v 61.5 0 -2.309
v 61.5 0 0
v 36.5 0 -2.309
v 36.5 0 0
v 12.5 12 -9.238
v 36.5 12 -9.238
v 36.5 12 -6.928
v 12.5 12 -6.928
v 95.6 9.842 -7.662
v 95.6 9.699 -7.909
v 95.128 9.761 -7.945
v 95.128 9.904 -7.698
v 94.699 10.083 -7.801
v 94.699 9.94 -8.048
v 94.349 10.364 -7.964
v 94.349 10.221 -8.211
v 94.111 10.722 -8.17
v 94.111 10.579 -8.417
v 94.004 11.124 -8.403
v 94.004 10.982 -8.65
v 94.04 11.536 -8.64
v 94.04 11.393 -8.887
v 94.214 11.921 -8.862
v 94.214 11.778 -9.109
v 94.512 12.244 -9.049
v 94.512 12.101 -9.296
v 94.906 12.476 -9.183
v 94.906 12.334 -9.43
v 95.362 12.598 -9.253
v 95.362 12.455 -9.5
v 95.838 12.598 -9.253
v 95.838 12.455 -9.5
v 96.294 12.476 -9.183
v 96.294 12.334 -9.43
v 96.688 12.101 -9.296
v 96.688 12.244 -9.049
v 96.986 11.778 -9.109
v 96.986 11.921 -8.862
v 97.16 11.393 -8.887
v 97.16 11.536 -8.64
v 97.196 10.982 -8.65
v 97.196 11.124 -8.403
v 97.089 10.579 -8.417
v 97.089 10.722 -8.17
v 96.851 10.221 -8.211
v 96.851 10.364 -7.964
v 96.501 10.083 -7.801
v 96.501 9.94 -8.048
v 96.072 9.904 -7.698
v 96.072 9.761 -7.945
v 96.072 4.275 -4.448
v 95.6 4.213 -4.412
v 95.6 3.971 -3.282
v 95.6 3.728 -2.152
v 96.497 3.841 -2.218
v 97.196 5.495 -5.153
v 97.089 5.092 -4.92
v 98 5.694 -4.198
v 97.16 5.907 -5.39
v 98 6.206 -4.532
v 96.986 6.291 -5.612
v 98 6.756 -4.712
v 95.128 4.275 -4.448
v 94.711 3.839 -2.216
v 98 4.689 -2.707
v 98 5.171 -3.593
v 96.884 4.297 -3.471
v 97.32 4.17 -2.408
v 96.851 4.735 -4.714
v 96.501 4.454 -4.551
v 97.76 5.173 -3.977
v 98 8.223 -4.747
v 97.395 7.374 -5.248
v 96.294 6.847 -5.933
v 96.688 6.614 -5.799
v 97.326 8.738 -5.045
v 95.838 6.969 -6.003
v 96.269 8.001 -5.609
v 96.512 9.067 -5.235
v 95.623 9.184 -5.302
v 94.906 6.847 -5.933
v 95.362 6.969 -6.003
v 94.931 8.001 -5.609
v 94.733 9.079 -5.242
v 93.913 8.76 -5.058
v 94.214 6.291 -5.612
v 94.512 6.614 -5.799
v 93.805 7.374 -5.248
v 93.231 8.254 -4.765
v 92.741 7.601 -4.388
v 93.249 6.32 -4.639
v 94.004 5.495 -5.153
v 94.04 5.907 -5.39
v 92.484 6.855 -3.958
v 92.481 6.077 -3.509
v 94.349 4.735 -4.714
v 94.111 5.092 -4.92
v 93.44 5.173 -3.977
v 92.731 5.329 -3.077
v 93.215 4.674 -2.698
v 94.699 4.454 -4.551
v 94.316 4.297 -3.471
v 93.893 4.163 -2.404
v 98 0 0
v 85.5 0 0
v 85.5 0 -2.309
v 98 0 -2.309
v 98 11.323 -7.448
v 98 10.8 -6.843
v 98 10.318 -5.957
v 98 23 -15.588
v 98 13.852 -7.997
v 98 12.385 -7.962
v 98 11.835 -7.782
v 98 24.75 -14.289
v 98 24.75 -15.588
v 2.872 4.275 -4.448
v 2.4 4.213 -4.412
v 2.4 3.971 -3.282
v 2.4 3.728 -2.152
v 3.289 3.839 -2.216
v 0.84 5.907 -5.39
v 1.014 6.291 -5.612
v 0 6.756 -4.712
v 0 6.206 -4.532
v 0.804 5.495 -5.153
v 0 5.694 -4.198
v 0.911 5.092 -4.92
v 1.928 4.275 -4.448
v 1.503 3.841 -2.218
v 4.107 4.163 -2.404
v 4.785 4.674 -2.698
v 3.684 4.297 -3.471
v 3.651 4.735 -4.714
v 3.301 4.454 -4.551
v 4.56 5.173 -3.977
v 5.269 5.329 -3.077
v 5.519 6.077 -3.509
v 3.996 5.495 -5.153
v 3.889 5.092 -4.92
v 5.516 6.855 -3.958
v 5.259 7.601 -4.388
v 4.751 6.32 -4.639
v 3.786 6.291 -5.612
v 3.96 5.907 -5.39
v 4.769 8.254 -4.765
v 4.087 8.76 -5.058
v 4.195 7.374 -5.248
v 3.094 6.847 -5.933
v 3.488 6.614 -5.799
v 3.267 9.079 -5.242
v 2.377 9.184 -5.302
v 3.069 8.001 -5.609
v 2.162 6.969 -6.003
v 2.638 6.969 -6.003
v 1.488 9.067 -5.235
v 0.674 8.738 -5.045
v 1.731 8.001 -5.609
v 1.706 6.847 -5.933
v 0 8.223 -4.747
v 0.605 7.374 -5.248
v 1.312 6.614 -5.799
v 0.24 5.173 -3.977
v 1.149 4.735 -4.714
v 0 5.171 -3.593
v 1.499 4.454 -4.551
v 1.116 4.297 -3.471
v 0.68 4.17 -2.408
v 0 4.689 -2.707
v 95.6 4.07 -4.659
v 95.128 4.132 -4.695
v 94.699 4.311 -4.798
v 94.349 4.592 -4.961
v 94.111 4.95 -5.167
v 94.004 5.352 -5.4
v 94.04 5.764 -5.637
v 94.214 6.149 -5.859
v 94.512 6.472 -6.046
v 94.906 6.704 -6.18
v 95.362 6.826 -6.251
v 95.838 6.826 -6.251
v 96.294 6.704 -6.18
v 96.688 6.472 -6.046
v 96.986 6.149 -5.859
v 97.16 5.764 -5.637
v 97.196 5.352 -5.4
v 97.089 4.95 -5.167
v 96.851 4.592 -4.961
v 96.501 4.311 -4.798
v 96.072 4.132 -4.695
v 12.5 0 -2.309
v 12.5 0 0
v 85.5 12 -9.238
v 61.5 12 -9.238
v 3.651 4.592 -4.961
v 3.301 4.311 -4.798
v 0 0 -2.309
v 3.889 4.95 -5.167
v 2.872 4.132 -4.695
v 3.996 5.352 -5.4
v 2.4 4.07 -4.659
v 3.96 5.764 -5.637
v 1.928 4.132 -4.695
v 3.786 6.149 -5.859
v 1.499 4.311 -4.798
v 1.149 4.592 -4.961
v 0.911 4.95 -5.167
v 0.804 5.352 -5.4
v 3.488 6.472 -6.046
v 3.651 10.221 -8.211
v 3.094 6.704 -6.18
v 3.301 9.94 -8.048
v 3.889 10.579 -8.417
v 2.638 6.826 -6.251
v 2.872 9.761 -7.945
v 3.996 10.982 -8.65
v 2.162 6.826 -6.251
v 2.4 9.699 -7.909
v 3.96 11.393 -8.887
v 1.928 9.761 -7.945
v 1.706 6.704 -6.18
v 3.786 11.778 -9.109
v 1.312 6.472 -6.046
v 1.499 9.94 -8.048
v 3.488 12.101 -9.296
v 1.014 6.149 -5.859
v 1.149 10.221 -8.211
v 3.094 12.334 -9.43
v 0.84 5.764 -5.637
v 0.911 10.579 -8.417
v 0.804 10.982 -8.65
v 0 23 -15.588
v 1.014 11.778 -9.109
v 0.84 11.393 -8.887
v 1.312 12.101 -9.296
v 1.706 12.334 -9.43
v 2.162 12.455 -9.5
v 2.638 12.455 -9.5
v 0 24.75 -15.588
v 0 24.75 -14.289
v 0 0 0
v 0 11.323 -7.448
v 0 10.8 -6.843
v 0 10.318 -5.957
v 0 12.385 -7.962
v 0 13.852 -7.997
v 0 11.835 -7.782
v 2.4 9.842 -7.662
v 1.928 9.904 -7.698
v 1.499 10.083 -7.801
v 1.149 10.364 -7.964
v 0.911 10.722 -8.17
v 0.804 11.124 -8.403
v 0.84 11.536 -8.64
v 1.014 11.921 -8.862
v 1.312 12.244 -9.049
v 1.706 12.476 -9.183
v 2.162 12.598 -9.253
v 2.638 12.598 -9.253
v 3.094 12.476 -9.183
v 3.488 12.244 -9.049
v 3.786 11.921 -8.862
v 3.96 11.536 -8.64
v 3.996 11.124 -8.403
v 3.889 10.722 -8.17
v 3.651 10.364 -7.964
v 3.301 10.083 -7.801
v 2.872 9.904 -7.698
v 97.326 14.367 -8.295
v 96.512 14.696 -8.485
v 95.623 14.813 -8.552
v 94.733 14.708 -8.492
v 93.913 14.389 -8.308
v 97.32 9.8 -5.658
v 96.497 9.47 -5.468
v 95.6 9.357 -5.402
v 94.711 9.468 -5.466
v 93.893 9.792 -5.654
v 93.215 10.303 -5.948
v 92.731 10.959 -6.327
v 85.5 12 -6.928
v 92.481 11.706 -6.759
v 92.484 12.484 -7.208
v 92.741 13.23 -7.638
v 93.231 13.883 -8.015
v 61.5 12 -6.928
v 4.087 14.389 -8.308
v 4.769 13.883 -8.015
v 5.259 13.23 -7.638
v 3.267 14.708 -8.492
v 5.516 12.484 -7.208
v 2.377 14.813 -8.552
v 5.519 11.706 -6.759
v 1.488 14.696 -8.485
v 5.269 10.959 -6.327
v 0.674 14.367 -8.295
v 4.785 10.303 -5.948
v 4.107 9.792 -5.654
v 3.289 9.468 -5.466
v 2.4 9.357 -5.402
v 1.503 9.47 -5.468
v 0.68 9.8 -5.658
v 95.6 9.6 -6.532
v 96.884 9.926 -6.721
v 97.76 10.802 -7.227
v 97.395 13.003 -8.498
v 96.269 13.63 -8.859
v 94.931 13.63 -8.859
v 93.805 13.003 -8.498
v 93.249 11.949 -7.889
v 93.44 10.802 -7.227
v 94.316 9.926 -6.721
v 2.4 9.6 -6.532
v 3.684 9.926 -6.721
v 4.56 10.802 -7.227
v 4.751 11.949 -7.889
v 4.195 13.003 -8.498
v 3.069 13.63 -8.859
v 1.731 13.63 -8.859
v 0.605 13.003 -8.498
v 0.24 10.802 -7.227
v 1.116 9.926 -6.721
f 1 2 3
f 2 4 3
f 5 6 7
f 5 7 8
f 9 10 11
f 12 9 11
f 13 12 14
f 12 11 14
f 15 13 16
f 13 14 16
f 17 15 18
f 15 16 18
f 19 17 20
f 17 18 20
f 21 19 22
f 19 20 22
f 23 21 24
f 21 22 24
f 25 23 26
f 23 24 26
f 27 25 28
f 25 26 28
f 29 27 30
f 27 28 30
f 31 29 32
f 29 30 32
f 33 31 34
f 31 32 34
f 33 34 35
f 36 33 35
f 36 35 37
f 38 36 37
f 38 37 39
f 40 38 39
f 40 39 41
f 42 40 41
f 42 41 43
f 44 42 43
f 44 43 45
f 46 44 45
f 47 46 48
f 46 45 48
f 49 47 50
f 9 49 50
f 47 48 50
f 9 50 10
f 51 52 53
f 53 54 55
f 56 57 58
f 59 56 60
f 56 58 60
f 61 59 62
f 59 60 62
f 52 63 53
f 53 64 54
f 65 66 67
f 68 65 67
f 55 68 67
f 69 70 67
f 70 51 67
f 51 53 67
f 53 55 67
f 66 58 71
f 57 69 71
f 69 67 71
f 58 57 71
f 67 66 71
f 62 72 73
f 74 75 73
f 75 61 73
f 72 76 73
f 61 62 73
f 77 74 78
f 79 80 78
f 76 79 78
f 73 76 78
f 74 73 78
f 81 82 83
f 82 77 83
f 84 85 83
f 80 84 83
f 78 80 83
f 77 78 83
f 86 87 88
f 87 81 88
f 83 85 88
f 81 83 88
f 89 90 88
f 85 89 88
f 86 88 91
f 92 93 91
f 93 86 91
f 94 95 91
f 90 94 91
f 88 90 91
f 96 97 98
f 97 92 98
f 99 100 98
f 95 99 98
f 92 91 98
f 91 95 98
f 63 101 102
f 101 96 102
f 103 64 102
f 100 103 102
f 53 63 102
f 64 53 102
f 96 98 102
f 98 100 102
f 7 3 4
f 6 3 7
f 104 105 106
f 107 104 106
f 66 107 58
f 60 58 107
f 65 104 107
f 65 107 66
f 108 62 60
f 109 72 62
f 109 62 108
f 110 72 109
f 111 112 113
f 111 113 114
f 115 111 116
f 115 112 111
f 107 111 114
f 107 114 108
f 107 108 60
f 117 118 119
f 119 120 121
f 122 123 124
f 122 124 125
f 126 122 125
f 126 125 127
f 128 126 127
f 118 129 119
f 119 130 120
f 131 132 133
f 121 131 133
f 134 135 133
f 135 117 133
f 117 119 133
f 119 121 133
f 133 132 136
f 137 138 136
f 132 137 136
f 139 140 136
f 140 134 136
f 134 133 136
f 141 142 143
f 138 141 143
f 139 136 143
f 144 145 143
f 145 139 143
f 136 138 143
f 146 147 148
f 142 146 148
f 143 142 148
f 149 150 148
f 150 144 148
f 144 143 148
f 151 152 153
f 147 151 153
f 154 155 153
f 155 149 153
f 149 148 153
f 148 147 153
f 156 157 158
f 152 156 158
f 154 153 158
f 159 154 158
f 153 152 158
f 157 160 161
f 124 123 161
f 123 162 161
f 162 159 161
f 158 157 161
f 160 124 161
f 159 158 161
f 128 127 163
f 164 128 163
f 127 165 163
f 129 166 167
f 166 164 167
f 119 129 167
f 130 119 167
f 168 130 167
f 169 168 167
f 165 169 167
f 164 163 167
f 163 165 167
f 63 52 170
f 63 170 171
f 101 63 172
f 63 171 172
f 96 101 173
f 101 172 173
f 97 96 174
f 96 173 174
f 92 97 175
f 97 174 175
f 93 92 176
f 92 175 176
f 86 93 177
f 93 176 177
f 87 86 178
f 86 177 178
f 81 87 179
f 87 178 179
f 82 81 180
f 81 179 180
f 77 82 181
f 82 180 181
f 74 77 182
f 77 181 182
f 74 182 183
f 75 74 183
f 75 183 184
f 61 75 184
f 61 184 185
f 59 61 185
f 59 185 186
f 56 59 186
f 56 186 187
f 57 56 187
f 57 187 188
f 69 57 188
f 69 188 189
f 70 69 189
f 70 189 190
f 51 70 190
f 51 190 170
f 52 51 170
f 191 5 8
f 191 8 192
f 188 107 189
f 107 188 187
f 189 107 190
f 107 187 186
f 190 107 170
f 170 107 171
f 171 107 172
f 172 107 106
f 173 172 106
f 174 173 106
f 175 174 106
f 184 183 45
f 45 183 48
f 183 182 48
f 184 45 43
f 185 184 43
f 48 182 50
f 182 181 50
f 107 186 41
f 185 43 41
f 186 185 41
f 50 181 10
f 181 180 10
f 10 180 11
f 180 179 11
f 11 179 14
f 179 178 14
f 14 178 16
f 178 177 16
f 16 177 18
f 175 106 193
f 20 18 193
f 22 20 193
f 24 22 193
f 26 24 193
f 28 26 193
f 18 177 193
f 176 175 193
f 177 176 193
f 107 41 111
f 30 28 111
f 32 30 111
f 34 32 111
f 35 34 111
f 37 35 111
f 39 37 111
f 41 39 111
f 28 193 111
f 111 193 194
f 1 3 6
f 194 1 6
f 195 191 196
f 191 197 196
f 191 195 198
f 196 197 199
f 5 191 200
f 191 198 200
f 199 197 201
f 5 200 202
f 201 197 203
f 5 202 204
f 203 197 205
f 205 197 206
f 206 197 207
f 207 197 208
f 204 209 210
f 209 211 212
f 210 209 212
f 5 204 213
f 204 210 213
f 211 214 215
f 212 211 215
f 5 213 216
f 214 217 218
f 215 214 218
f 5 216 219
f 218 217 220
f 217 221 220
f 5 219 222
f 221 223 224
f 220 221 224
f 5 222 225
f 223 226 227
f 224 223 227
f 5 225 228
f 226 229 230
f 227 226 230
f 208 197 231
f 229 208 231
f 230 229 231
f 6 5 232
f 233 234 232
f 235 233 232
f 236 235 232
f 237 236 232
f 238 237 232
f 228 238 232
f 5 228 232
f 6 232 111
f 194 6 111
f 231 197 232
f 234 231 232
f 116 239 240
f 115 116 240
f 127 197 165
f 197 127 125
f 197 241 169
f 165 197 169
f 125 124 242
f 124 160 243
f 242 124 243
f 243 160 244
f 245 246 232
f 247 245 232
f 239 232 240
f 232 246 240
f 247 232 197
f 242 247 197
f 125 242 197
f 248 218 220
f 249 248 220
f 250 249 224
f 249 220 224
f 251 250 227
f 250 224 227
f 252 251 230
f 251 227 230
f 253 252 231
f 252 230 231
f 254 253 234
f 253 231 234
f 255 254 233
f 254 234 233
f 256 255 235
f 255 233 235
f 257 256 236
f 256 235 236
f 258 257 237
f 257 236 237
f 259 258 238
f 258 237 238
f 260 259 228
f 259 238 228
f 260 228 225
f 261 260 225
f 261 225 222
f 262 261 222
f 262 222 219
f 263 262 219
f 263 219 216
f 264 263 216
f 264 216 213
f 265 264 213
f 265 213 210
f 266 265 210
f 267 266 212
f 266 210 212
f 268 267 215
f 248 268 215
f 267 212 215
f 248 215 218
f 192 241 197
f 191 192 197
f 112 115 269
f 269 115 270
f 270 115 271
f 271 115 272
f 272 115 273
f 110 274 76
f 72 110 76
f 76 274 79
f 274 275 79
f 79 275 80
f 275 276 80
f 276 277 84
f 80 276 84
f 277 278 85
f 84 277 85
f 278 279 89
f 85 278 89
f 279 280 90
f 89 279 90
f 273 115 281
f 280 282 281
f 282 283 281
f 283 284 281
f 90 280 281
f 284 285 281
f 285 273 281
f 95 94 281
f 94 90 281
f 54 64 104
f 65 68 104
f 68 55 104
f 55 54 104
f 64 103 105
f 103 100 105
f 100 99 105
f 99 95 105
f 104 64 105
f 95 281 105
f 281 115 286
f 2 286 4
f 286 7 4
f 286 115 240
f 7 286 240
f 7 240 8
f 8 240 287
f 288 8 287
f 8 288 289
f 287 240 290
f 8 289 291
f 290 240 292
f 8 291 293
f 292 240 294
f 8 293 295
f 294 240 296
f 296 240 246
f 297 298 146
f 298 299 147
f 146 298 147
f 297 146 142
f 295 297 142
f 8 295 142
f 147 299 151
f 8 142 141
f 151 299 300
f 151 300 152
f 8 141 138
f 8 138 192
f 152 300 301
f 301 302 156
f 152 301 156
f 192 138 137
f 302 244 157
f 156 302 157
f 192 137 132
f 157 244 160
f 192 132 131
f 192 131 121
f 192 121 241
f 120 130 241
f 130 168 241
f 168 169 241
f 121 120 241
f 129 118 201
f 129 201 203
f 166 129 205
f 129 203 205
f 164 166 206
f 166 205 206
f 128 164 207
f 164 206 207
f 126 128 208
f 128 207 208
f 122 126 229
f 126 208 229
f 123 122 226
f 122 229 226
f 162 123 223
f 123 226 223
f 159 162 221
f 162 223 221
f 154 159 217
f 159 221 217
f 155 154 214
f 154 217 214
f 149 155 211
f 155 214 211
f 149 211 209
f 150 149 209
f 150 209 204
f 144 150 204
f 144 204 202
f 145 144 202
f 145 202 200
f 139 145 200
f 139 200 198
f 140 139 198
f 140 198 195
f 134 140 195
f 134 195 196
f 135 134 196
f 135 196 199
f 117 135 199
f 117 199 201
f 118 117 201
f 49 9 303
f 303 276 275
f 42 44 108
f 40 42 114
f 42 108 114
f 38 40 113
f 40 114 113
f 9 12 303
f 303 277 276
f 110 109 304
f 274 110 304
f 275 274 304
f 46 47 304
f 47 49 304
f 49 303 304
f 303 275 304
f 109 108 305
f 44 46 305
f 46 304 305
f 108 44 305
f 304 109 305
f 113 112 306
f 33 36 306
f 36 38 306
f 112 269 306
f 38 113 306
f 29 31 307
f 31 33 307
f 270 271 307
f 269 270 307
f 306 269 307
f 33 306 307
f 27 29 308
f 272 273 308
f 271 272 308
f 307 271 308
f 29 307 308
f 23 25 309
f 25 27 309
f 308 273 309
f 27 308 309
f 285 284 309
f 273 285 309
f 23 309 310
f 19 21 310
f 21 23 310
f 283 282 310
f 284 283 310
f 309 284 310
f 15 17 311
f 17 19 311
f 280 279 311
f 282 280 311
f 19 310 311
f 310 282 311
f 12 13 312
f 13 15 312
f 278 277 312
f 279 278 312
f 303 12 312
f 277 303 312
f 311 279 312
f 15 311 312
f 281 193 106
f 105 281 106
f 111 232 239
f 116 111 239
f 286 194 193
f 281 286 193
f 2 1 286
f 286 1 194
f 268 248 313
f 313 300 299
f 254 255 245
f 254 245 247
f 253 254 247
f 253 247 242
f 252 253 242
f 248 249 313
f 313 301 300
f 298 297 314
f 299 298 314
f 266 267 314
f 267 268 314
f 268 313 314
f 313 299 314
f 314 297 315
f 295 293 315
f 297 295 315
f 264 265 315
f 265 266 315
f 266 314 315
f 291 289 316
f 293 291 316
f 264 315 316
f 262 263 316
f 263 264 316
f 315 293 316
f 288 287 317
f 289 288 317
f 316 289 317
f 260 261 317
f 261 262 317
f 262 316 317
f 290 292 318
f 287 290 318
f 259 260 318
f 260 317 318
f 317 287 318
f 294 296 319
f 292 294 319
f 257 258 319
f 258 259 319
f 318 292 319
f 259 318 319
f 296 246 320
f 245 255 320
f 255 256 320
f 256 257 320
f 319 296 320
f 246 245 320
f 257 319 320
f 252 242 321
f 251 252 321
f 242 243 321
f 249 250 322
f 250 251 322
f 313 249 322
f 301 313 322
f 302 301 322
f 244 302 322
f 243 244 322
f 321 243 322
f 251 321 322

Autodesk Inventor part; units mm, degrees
ref_plane "YZ Plane" through (0, 0, 0) normal (1, 0, 0) x (0, 1, 0)
ref_plane "XZ Plane" through (0, 0, 0) normal (0, 1, 0) x (-1, 0, 0)
ref_plane "XY Plane" through (0, 0, 0) normal (0, 0, 1) x (1, 0, 0)
sketch "Szkic1" plane through (0, 0, 0) normal (1, 0, 0) x (0, 1, 0)
  line L0 (0, 0) -> (0, -2.3094)
  line L1 (0, -2.3094) -> (23, -15.5885)
  line L2 (24.75, -14.2894) -> (0, 0)
  line L3 (23, -15.5885) -> (24.75, -15.5885)
  line L4 (24.75, -15.5885) -> (24.75, -14.2894)
  dimension "d0" = 60
  dimension "d1" = 2
  dimension "d2" = 1.75
  dimension "d3" = 23
extrude "Wyciągnięcie proste1" add sketch "Szkic1" along normal blind 98
sketch "Szkic2" plane through (98, 24.75, -15.5885) normal (0, 0, -1) x (-1, 0, 0)
  line L0 (98, -24.75) -> (0, -24.75) construction
  line L1 (12.5, -24.75) -> (36.5, -24.75)
  line L2 (36.5, -24.75) -> (36.5, -12.75)
  line L3 (36.5, -12.75) -> (12.5, -12.75)
  line L4 (12.5, -12.75) -> (12.5, -24.75)
  line L5 (49, -24.75) -> (49, 0) construction
  line L6 (98, 0) -> (0, 0) construction
  line L7 (85.5, -24.75) -> (61.5, -24.75)
  line L8 (61.5, -24.75) -> (61.5, -12.75)
  line L9 (61.5, -12.75) -> (85.5, -12.75)
  line L10 (85.5, -12.75) -> (85.5, -24.75)
  line L11 (0, -24.75) -> (0, -1.75) construction
  dimension "d6" = 12
  dimension "d7" = 24
  dimension "d8" = 12.5
extrude "Wyciągnięcie proste2" cut sketch "Szkic2" against normal through all
sketch "Szkic3" plane through (0, 24.75, -14.2894) normal (0, 0.5, 0.8660254) x (1, 0, 0)
  line L0 (0, -28.5788) -> (12.5, -28.5788) construction
  line L1 (2.4, -28.5788) -> (2.4, -14.6241) construction
  line L2 (0, 0) -> (0, -28.5788) construction
  line L3 (0, -27.4241) -> (12.5, -27.4241) construction
  line L4 (36.5, -28.5788) -> (61.5, -28.5788) construction
  line L5 (49, -28.5788) -> (49, 0.6495) construction
  line L6 (0, 0.6495) -> (98, 0.6495) construction
  point P0 (2.4, -21.1241)
  point P1 (95.6, -14.6241)
  point P2 (95.6, -21.1241)
  dimension "d11" = 2.4
  dimension "d12" = 6.3
  dimension "d13" = 12.8
hole "Otwór1" at (2.4, 12.0851, -6.9774) at (2.4, 6.456, -3.7274) at (95.6, 12.0851, -6.9774) at (95.6, 6.456, -3.7274) direction (0, -0.5, -0.8660254) diameter 3.2 depth 5 tip angle 118 countersink diameter 6.3 countersink angle 84.225 clearance for "Śruba ze łbem stożkowym ISO 2009/7046" size "M3" standard "ISO"
properties part number "Przod" material "Aluminium 6061"
